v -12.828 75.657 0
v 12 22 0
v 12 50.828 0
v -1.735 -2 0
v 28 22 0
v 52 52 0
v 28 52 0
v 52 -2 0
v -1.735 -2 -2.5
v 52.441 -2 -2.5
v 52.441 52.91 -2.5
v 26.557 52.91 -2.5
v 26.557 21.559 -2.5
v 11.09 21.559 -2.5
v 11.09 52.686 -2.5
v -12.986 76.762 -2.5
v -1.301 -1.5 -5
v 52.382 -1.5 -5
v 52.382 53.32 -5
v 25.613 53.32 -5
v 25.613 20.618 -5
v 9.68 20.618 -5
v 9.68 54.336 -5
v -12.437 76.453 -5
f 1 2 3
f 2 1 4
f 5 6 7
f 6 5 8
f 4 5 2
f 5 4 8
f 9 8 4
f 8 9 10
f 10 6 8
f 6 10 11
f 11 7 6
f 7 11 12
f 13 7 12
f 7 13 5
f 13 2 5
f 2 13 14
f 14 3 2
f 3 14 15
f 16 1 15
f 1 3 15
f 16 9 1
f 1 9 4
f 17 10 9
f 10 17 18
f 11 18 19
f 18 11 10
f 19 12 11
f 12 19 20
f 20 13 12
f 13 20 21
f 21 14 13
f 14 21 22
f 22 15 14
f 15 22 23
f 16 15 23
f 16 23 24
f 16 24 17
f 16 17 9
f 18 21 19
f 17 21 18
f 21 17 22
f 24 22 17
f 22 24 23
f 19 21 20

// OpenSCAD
test_points = [
    [0, 0],   [50, 0],   [50, 50], 
    [30, 50], [30, 20],  [10, 20], 
    [10, 50], [-10, 70]
];
test_angles = [0, 10, 20, 30, -10, -20, 15, 0];

AssertEqualModules() {
    Wall(
        points = test_points,
        thickness = 5,
        angles = test_angles,
        glue_crack = 0.5,
        offsets = 2
    );
    polyhedron([[-1.73459, -2, 0], [52, -2, 0], [52, 52, 0], [28, 52, 0], [28, 22, 0], [12, 22, 0], [12, 50.8284, 0], [-12.8284, 75.6569, 0], [-1.73459, -2, -2.5], [52.4408, -2, -2.5], [52.4408, 52.9099, -2.5], [26.5566, 52.9099, -2.5], [26.5566, 21.5592, -2.5], [11.0901, 21.5592, -2.5], [11.0901, 52.6857, -2.5], [-12.9863, 76.7621, -2.5], [-1.30094, -1.5, -5], [52.3816, -1.5, -5], [52.3816, 53.3199, -5], [25.6132, 53.3199, -5], [25.6132, 20.6184, -5], [9.68015, 20.6184, -5], [9.68015, 54.3359, -5], [-12.4371, 76.4531, -5]], [[7, 6, 5, 4, 3, 2, 1, 0], [0, 1, 9, 8], [1, 2, 10, 9], [2, 3, 11, 10], [3, 4, 12, 11], [4, 5, 13, 12], [5, 6, 14, 13], [6, 7, 15, 14], [7, 0, 8, 15], [8, 9, 17, 16], [9, 10, 18, 17], [10, 11, 19, 18], [11, 12, 20, 19], [12, 13, 21, 20], [13, 14, 22, 21], [14, 15, 23, 22], [15, 8, 16, 23], [16, 17, 18, 19, 20, 21, 22, 23]], convexity = 3);
}

module AssertEqualModules() {
    module Error() {
        hull() {
            difference() {
                children(0);
                children(1);
            }
            difference() {
                children(0);
                children(1);
            }
        }
    }
    color("green") difference() {
        children(0);
        Error() {children(0); children(1);}
    }
    color("red") intersection() {
        children(0);
        Error() {children(0); children(1);}
    }
}

module Wall(
        points,
        thickness                 = 1,
        angles                    = undef,
        offsets                   = undef,
        angled_offsets            = undef,
        glue_crack                = 0.1,
        glue_crack_relative_depth = 0.5,
        glue_crack_depth          = undef
) {
    use_glue_crack_depth = (!is_undef(glue_crack_depth)) ? (
        glue_crack_depth
    ) : (
        thickness * glue_crack_relative_depth
    );
    assert(is_num(use_glue_crack_depth) && use_glue_crack_depth >= 0 && use_glue_crack_depth < thickness);
    
    top_offsets = [for (i=[0:len(points)-1]) (
        get_value_from_list(offsets, i, 0)
        + get_value_from_list(angled_offsets, i, 0) / cos(get_value_from_list(angles, i, 0))
    )];
    top_points = [for(p = get_offset_polygon_2d(points, -top_offsets)) [
        p[0], p[1], 0]];
    
    middle_offsets = [for (i=[0:len(points)-1]) (
        top_offsets[i]
        + use_glue_crack_depth * tan(get_value_from_list(angles, i, 0))
    )];
    middle_points = [for(p = get_offset_polygon_2d(points, -middle_offsets)) [
        p[0], p[1], -use_glue_crack_depth]];
    
    bottom_offsets = [for (i=[0:len(points)-1]) (
        top_offsets[i]
        + thickness * tan(get_value_from_list(angles, i, 0))
        - get_value_from_list(glue_crack, i, 0)
    )];
    bottom_points = [for(p = get_offset_polygon_2d(points, -bottom_offsets)) [
        p[0], p[1], -thickness]];
    
    points = concat(top_points, middle_points, bottom_points);
    
    top_face    = [for(i=[len(bottom_points)-1:-1:0])i];
    bottom_face = [for(i=[0:len(top_points)-1])len(top_points)*2+i];
    side_faces  = [for(j=[0:1], i=[0:len(top_points)-1])
        [
            (len(top_points)*j) + (i + 0),
            (len(top_points)*j) + (i + 1) % len(top_points),        
            (len(top_points)*j) + (i + 1) % len(top_points) + len(top_points),
            (len(top_points)*j) + (i + 0) + len(top_points)
        ]
    ];
    faces = concat([top_face], side_faces, [bottom_face]);
    render() polyhedron(points, faces, convexity=3);
}

function get_offset_intersection_2d(p1, p2, p3, offset1, offset2) =
    let (
        v1 = p2 - p1, // Vector from p1 to p2
        v2 = p3 - p2, // Vector from p2 to p3

        n1_unnorm = [-v1[1], v1[0]],
        n2_unnorm = [-v2[1], v2[0]],

        offset_vec1 = n1_unnorm / norm(n1_unnorm) * offset1,
        offset_vec2 = n2_unnorm / norm(n2_unnorm) * offset2,

        p1_offset          = p1 + offset_vec1,
        p2_on_line1_offset = p2 + offset_vec1,
        p2_on_line2_offset = p2 + offset_vec2,
        p3_offset          = p3 + offset_vec2,

        a1 = p2_on_line1_offset[1] - p1_offset[1],
        b1 = p1_offset[0] - p2_on_line1_offset[0],
        c1 = a1 * p1_offset[0] + b1 * p1_offset[1],

        a2 = p3_offset[1] - p2_on_line2_offset[1],
        b2 = p2_on_line2_offset[0] - p3_offset[0],
        c2 = a2 * p2_on_line2_offset[0] + b2 * p2_on_line2_offset[1],

        det = a1 * b2 - a2 * b1
    )
    (abs(det) < 1e-9) ? undef :
    [
        (c1 * b2 - c2 * b1) / det,
        (a1 * c2 - a2 * c1) / det
    ];

function get_offset_polygon_2d(points, offsets) = (
    [ for (i = [0 : len(points) - 1]) (
        let (
            i0 = (i + len(points) - 1) % len(points),
            i1 = i,
            i2 = (i + 1) % len(points),
            p0 = points[i0],
            p1 = points[i1],
            p2 = points[i2],
            offset1 = offsets[i0],
            offset2 = offsets[i1]
        )
        get_offset_intersection_2d(p0, p1, p2, offset1, offset2)
    )]
);

function get_value_from_list(list, index, default) = (
    (is_num(list)) ? (
        list
    ) : (is_list(list) && len(list) > index) ? (
        list[index]
    ) : (
        default
    )
);
